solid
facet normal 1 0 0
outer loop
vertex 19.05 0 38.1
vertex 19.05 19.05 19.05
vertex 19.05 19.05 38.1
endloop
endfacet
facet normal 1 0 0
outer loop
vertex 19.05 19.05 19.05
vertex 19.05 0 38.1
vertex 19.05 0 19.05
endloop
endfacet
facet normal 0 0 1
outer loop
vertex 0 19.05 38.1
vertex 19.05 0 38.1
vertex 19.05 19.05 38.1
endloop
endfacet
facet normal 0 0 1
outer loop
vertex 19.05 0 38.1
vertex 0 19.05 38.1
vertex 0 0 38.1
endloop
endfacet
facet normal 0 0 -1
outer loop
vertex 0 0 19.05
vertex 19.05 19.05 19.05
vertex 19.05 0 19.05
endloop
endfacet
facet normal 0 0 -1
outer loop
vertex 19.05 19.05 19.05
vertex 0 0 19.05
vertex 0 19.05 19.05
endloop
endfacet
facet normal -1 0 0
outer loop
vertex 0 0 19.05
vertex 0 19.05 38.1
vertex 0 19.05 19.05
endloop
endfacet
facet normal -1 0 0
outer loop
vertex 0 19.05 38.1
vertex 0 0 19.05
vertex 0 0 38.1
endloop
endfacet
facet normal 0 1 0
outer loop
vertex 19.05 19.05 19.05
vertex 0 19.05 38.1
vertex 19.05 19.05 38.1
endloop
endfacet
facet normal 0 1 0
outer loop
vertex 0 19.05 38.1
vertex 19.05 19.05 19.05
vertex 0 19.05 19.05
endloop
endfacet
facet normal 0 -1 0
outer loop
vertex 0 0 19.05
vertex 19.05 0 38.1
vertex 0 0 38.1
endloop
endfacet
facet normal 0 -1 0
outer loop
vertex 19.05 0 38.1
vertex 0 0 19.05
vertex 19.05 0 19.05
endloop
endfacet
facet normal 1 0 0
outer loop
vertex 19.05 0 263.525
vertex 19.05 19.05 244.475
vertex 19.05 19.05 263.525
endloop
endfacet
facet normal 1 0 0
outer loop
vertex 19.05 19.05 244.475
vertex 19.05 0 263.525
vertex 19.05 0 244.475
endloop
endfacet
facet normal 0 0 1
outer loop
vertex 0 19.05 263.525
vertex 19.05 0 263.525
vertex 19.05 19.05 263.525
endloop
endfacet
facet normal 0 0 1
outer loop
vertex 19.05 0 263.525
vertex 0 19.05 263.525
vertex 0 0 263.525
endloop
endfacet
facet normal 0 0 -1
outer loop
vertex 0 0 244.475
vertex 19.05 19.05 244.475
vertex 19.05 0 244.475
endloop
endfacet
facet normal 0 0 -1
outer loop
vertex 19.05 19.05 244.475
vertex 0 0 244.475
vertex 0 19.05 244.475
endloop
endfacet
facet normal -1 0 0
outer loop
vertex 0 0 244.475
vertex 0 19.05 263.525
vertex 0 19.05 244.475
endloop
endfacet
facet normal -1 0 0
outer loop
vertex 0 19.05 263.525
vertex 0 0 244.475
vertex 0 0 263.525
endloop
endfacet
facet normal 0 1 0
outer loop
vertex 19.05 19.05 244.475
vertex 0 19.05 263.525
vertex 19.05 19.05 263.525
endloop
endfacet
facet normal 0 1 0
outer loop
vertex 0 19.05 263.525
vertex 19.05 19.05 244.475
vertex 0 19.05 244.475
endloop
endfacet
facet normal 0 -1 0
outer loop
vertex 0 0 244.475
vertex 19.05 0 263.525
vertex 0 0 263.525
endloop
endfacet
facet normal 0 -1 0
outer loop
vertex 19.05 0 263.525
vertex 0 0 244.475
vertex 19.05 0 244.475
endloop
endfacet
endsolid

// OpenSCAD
in2mm=25.4;
beehiveDimensions = [(19+7/8) * in2mm, 16.25 * in2mm, (9+5/8) * in2mm];
woodWidth = 3/4*in2mm;

//cube([beehiveDimensions.x,woodWidth,beehiveDimensions.z]);

color(["blue"])
//
for (i=[woodWidth, woodWidth, beehiveDimensions.z])
  translate([0,0,i])
{
    //echo(i);
    echo(i*2);
    cube([woodWidth,woodWidth,woodWidth]);
}
